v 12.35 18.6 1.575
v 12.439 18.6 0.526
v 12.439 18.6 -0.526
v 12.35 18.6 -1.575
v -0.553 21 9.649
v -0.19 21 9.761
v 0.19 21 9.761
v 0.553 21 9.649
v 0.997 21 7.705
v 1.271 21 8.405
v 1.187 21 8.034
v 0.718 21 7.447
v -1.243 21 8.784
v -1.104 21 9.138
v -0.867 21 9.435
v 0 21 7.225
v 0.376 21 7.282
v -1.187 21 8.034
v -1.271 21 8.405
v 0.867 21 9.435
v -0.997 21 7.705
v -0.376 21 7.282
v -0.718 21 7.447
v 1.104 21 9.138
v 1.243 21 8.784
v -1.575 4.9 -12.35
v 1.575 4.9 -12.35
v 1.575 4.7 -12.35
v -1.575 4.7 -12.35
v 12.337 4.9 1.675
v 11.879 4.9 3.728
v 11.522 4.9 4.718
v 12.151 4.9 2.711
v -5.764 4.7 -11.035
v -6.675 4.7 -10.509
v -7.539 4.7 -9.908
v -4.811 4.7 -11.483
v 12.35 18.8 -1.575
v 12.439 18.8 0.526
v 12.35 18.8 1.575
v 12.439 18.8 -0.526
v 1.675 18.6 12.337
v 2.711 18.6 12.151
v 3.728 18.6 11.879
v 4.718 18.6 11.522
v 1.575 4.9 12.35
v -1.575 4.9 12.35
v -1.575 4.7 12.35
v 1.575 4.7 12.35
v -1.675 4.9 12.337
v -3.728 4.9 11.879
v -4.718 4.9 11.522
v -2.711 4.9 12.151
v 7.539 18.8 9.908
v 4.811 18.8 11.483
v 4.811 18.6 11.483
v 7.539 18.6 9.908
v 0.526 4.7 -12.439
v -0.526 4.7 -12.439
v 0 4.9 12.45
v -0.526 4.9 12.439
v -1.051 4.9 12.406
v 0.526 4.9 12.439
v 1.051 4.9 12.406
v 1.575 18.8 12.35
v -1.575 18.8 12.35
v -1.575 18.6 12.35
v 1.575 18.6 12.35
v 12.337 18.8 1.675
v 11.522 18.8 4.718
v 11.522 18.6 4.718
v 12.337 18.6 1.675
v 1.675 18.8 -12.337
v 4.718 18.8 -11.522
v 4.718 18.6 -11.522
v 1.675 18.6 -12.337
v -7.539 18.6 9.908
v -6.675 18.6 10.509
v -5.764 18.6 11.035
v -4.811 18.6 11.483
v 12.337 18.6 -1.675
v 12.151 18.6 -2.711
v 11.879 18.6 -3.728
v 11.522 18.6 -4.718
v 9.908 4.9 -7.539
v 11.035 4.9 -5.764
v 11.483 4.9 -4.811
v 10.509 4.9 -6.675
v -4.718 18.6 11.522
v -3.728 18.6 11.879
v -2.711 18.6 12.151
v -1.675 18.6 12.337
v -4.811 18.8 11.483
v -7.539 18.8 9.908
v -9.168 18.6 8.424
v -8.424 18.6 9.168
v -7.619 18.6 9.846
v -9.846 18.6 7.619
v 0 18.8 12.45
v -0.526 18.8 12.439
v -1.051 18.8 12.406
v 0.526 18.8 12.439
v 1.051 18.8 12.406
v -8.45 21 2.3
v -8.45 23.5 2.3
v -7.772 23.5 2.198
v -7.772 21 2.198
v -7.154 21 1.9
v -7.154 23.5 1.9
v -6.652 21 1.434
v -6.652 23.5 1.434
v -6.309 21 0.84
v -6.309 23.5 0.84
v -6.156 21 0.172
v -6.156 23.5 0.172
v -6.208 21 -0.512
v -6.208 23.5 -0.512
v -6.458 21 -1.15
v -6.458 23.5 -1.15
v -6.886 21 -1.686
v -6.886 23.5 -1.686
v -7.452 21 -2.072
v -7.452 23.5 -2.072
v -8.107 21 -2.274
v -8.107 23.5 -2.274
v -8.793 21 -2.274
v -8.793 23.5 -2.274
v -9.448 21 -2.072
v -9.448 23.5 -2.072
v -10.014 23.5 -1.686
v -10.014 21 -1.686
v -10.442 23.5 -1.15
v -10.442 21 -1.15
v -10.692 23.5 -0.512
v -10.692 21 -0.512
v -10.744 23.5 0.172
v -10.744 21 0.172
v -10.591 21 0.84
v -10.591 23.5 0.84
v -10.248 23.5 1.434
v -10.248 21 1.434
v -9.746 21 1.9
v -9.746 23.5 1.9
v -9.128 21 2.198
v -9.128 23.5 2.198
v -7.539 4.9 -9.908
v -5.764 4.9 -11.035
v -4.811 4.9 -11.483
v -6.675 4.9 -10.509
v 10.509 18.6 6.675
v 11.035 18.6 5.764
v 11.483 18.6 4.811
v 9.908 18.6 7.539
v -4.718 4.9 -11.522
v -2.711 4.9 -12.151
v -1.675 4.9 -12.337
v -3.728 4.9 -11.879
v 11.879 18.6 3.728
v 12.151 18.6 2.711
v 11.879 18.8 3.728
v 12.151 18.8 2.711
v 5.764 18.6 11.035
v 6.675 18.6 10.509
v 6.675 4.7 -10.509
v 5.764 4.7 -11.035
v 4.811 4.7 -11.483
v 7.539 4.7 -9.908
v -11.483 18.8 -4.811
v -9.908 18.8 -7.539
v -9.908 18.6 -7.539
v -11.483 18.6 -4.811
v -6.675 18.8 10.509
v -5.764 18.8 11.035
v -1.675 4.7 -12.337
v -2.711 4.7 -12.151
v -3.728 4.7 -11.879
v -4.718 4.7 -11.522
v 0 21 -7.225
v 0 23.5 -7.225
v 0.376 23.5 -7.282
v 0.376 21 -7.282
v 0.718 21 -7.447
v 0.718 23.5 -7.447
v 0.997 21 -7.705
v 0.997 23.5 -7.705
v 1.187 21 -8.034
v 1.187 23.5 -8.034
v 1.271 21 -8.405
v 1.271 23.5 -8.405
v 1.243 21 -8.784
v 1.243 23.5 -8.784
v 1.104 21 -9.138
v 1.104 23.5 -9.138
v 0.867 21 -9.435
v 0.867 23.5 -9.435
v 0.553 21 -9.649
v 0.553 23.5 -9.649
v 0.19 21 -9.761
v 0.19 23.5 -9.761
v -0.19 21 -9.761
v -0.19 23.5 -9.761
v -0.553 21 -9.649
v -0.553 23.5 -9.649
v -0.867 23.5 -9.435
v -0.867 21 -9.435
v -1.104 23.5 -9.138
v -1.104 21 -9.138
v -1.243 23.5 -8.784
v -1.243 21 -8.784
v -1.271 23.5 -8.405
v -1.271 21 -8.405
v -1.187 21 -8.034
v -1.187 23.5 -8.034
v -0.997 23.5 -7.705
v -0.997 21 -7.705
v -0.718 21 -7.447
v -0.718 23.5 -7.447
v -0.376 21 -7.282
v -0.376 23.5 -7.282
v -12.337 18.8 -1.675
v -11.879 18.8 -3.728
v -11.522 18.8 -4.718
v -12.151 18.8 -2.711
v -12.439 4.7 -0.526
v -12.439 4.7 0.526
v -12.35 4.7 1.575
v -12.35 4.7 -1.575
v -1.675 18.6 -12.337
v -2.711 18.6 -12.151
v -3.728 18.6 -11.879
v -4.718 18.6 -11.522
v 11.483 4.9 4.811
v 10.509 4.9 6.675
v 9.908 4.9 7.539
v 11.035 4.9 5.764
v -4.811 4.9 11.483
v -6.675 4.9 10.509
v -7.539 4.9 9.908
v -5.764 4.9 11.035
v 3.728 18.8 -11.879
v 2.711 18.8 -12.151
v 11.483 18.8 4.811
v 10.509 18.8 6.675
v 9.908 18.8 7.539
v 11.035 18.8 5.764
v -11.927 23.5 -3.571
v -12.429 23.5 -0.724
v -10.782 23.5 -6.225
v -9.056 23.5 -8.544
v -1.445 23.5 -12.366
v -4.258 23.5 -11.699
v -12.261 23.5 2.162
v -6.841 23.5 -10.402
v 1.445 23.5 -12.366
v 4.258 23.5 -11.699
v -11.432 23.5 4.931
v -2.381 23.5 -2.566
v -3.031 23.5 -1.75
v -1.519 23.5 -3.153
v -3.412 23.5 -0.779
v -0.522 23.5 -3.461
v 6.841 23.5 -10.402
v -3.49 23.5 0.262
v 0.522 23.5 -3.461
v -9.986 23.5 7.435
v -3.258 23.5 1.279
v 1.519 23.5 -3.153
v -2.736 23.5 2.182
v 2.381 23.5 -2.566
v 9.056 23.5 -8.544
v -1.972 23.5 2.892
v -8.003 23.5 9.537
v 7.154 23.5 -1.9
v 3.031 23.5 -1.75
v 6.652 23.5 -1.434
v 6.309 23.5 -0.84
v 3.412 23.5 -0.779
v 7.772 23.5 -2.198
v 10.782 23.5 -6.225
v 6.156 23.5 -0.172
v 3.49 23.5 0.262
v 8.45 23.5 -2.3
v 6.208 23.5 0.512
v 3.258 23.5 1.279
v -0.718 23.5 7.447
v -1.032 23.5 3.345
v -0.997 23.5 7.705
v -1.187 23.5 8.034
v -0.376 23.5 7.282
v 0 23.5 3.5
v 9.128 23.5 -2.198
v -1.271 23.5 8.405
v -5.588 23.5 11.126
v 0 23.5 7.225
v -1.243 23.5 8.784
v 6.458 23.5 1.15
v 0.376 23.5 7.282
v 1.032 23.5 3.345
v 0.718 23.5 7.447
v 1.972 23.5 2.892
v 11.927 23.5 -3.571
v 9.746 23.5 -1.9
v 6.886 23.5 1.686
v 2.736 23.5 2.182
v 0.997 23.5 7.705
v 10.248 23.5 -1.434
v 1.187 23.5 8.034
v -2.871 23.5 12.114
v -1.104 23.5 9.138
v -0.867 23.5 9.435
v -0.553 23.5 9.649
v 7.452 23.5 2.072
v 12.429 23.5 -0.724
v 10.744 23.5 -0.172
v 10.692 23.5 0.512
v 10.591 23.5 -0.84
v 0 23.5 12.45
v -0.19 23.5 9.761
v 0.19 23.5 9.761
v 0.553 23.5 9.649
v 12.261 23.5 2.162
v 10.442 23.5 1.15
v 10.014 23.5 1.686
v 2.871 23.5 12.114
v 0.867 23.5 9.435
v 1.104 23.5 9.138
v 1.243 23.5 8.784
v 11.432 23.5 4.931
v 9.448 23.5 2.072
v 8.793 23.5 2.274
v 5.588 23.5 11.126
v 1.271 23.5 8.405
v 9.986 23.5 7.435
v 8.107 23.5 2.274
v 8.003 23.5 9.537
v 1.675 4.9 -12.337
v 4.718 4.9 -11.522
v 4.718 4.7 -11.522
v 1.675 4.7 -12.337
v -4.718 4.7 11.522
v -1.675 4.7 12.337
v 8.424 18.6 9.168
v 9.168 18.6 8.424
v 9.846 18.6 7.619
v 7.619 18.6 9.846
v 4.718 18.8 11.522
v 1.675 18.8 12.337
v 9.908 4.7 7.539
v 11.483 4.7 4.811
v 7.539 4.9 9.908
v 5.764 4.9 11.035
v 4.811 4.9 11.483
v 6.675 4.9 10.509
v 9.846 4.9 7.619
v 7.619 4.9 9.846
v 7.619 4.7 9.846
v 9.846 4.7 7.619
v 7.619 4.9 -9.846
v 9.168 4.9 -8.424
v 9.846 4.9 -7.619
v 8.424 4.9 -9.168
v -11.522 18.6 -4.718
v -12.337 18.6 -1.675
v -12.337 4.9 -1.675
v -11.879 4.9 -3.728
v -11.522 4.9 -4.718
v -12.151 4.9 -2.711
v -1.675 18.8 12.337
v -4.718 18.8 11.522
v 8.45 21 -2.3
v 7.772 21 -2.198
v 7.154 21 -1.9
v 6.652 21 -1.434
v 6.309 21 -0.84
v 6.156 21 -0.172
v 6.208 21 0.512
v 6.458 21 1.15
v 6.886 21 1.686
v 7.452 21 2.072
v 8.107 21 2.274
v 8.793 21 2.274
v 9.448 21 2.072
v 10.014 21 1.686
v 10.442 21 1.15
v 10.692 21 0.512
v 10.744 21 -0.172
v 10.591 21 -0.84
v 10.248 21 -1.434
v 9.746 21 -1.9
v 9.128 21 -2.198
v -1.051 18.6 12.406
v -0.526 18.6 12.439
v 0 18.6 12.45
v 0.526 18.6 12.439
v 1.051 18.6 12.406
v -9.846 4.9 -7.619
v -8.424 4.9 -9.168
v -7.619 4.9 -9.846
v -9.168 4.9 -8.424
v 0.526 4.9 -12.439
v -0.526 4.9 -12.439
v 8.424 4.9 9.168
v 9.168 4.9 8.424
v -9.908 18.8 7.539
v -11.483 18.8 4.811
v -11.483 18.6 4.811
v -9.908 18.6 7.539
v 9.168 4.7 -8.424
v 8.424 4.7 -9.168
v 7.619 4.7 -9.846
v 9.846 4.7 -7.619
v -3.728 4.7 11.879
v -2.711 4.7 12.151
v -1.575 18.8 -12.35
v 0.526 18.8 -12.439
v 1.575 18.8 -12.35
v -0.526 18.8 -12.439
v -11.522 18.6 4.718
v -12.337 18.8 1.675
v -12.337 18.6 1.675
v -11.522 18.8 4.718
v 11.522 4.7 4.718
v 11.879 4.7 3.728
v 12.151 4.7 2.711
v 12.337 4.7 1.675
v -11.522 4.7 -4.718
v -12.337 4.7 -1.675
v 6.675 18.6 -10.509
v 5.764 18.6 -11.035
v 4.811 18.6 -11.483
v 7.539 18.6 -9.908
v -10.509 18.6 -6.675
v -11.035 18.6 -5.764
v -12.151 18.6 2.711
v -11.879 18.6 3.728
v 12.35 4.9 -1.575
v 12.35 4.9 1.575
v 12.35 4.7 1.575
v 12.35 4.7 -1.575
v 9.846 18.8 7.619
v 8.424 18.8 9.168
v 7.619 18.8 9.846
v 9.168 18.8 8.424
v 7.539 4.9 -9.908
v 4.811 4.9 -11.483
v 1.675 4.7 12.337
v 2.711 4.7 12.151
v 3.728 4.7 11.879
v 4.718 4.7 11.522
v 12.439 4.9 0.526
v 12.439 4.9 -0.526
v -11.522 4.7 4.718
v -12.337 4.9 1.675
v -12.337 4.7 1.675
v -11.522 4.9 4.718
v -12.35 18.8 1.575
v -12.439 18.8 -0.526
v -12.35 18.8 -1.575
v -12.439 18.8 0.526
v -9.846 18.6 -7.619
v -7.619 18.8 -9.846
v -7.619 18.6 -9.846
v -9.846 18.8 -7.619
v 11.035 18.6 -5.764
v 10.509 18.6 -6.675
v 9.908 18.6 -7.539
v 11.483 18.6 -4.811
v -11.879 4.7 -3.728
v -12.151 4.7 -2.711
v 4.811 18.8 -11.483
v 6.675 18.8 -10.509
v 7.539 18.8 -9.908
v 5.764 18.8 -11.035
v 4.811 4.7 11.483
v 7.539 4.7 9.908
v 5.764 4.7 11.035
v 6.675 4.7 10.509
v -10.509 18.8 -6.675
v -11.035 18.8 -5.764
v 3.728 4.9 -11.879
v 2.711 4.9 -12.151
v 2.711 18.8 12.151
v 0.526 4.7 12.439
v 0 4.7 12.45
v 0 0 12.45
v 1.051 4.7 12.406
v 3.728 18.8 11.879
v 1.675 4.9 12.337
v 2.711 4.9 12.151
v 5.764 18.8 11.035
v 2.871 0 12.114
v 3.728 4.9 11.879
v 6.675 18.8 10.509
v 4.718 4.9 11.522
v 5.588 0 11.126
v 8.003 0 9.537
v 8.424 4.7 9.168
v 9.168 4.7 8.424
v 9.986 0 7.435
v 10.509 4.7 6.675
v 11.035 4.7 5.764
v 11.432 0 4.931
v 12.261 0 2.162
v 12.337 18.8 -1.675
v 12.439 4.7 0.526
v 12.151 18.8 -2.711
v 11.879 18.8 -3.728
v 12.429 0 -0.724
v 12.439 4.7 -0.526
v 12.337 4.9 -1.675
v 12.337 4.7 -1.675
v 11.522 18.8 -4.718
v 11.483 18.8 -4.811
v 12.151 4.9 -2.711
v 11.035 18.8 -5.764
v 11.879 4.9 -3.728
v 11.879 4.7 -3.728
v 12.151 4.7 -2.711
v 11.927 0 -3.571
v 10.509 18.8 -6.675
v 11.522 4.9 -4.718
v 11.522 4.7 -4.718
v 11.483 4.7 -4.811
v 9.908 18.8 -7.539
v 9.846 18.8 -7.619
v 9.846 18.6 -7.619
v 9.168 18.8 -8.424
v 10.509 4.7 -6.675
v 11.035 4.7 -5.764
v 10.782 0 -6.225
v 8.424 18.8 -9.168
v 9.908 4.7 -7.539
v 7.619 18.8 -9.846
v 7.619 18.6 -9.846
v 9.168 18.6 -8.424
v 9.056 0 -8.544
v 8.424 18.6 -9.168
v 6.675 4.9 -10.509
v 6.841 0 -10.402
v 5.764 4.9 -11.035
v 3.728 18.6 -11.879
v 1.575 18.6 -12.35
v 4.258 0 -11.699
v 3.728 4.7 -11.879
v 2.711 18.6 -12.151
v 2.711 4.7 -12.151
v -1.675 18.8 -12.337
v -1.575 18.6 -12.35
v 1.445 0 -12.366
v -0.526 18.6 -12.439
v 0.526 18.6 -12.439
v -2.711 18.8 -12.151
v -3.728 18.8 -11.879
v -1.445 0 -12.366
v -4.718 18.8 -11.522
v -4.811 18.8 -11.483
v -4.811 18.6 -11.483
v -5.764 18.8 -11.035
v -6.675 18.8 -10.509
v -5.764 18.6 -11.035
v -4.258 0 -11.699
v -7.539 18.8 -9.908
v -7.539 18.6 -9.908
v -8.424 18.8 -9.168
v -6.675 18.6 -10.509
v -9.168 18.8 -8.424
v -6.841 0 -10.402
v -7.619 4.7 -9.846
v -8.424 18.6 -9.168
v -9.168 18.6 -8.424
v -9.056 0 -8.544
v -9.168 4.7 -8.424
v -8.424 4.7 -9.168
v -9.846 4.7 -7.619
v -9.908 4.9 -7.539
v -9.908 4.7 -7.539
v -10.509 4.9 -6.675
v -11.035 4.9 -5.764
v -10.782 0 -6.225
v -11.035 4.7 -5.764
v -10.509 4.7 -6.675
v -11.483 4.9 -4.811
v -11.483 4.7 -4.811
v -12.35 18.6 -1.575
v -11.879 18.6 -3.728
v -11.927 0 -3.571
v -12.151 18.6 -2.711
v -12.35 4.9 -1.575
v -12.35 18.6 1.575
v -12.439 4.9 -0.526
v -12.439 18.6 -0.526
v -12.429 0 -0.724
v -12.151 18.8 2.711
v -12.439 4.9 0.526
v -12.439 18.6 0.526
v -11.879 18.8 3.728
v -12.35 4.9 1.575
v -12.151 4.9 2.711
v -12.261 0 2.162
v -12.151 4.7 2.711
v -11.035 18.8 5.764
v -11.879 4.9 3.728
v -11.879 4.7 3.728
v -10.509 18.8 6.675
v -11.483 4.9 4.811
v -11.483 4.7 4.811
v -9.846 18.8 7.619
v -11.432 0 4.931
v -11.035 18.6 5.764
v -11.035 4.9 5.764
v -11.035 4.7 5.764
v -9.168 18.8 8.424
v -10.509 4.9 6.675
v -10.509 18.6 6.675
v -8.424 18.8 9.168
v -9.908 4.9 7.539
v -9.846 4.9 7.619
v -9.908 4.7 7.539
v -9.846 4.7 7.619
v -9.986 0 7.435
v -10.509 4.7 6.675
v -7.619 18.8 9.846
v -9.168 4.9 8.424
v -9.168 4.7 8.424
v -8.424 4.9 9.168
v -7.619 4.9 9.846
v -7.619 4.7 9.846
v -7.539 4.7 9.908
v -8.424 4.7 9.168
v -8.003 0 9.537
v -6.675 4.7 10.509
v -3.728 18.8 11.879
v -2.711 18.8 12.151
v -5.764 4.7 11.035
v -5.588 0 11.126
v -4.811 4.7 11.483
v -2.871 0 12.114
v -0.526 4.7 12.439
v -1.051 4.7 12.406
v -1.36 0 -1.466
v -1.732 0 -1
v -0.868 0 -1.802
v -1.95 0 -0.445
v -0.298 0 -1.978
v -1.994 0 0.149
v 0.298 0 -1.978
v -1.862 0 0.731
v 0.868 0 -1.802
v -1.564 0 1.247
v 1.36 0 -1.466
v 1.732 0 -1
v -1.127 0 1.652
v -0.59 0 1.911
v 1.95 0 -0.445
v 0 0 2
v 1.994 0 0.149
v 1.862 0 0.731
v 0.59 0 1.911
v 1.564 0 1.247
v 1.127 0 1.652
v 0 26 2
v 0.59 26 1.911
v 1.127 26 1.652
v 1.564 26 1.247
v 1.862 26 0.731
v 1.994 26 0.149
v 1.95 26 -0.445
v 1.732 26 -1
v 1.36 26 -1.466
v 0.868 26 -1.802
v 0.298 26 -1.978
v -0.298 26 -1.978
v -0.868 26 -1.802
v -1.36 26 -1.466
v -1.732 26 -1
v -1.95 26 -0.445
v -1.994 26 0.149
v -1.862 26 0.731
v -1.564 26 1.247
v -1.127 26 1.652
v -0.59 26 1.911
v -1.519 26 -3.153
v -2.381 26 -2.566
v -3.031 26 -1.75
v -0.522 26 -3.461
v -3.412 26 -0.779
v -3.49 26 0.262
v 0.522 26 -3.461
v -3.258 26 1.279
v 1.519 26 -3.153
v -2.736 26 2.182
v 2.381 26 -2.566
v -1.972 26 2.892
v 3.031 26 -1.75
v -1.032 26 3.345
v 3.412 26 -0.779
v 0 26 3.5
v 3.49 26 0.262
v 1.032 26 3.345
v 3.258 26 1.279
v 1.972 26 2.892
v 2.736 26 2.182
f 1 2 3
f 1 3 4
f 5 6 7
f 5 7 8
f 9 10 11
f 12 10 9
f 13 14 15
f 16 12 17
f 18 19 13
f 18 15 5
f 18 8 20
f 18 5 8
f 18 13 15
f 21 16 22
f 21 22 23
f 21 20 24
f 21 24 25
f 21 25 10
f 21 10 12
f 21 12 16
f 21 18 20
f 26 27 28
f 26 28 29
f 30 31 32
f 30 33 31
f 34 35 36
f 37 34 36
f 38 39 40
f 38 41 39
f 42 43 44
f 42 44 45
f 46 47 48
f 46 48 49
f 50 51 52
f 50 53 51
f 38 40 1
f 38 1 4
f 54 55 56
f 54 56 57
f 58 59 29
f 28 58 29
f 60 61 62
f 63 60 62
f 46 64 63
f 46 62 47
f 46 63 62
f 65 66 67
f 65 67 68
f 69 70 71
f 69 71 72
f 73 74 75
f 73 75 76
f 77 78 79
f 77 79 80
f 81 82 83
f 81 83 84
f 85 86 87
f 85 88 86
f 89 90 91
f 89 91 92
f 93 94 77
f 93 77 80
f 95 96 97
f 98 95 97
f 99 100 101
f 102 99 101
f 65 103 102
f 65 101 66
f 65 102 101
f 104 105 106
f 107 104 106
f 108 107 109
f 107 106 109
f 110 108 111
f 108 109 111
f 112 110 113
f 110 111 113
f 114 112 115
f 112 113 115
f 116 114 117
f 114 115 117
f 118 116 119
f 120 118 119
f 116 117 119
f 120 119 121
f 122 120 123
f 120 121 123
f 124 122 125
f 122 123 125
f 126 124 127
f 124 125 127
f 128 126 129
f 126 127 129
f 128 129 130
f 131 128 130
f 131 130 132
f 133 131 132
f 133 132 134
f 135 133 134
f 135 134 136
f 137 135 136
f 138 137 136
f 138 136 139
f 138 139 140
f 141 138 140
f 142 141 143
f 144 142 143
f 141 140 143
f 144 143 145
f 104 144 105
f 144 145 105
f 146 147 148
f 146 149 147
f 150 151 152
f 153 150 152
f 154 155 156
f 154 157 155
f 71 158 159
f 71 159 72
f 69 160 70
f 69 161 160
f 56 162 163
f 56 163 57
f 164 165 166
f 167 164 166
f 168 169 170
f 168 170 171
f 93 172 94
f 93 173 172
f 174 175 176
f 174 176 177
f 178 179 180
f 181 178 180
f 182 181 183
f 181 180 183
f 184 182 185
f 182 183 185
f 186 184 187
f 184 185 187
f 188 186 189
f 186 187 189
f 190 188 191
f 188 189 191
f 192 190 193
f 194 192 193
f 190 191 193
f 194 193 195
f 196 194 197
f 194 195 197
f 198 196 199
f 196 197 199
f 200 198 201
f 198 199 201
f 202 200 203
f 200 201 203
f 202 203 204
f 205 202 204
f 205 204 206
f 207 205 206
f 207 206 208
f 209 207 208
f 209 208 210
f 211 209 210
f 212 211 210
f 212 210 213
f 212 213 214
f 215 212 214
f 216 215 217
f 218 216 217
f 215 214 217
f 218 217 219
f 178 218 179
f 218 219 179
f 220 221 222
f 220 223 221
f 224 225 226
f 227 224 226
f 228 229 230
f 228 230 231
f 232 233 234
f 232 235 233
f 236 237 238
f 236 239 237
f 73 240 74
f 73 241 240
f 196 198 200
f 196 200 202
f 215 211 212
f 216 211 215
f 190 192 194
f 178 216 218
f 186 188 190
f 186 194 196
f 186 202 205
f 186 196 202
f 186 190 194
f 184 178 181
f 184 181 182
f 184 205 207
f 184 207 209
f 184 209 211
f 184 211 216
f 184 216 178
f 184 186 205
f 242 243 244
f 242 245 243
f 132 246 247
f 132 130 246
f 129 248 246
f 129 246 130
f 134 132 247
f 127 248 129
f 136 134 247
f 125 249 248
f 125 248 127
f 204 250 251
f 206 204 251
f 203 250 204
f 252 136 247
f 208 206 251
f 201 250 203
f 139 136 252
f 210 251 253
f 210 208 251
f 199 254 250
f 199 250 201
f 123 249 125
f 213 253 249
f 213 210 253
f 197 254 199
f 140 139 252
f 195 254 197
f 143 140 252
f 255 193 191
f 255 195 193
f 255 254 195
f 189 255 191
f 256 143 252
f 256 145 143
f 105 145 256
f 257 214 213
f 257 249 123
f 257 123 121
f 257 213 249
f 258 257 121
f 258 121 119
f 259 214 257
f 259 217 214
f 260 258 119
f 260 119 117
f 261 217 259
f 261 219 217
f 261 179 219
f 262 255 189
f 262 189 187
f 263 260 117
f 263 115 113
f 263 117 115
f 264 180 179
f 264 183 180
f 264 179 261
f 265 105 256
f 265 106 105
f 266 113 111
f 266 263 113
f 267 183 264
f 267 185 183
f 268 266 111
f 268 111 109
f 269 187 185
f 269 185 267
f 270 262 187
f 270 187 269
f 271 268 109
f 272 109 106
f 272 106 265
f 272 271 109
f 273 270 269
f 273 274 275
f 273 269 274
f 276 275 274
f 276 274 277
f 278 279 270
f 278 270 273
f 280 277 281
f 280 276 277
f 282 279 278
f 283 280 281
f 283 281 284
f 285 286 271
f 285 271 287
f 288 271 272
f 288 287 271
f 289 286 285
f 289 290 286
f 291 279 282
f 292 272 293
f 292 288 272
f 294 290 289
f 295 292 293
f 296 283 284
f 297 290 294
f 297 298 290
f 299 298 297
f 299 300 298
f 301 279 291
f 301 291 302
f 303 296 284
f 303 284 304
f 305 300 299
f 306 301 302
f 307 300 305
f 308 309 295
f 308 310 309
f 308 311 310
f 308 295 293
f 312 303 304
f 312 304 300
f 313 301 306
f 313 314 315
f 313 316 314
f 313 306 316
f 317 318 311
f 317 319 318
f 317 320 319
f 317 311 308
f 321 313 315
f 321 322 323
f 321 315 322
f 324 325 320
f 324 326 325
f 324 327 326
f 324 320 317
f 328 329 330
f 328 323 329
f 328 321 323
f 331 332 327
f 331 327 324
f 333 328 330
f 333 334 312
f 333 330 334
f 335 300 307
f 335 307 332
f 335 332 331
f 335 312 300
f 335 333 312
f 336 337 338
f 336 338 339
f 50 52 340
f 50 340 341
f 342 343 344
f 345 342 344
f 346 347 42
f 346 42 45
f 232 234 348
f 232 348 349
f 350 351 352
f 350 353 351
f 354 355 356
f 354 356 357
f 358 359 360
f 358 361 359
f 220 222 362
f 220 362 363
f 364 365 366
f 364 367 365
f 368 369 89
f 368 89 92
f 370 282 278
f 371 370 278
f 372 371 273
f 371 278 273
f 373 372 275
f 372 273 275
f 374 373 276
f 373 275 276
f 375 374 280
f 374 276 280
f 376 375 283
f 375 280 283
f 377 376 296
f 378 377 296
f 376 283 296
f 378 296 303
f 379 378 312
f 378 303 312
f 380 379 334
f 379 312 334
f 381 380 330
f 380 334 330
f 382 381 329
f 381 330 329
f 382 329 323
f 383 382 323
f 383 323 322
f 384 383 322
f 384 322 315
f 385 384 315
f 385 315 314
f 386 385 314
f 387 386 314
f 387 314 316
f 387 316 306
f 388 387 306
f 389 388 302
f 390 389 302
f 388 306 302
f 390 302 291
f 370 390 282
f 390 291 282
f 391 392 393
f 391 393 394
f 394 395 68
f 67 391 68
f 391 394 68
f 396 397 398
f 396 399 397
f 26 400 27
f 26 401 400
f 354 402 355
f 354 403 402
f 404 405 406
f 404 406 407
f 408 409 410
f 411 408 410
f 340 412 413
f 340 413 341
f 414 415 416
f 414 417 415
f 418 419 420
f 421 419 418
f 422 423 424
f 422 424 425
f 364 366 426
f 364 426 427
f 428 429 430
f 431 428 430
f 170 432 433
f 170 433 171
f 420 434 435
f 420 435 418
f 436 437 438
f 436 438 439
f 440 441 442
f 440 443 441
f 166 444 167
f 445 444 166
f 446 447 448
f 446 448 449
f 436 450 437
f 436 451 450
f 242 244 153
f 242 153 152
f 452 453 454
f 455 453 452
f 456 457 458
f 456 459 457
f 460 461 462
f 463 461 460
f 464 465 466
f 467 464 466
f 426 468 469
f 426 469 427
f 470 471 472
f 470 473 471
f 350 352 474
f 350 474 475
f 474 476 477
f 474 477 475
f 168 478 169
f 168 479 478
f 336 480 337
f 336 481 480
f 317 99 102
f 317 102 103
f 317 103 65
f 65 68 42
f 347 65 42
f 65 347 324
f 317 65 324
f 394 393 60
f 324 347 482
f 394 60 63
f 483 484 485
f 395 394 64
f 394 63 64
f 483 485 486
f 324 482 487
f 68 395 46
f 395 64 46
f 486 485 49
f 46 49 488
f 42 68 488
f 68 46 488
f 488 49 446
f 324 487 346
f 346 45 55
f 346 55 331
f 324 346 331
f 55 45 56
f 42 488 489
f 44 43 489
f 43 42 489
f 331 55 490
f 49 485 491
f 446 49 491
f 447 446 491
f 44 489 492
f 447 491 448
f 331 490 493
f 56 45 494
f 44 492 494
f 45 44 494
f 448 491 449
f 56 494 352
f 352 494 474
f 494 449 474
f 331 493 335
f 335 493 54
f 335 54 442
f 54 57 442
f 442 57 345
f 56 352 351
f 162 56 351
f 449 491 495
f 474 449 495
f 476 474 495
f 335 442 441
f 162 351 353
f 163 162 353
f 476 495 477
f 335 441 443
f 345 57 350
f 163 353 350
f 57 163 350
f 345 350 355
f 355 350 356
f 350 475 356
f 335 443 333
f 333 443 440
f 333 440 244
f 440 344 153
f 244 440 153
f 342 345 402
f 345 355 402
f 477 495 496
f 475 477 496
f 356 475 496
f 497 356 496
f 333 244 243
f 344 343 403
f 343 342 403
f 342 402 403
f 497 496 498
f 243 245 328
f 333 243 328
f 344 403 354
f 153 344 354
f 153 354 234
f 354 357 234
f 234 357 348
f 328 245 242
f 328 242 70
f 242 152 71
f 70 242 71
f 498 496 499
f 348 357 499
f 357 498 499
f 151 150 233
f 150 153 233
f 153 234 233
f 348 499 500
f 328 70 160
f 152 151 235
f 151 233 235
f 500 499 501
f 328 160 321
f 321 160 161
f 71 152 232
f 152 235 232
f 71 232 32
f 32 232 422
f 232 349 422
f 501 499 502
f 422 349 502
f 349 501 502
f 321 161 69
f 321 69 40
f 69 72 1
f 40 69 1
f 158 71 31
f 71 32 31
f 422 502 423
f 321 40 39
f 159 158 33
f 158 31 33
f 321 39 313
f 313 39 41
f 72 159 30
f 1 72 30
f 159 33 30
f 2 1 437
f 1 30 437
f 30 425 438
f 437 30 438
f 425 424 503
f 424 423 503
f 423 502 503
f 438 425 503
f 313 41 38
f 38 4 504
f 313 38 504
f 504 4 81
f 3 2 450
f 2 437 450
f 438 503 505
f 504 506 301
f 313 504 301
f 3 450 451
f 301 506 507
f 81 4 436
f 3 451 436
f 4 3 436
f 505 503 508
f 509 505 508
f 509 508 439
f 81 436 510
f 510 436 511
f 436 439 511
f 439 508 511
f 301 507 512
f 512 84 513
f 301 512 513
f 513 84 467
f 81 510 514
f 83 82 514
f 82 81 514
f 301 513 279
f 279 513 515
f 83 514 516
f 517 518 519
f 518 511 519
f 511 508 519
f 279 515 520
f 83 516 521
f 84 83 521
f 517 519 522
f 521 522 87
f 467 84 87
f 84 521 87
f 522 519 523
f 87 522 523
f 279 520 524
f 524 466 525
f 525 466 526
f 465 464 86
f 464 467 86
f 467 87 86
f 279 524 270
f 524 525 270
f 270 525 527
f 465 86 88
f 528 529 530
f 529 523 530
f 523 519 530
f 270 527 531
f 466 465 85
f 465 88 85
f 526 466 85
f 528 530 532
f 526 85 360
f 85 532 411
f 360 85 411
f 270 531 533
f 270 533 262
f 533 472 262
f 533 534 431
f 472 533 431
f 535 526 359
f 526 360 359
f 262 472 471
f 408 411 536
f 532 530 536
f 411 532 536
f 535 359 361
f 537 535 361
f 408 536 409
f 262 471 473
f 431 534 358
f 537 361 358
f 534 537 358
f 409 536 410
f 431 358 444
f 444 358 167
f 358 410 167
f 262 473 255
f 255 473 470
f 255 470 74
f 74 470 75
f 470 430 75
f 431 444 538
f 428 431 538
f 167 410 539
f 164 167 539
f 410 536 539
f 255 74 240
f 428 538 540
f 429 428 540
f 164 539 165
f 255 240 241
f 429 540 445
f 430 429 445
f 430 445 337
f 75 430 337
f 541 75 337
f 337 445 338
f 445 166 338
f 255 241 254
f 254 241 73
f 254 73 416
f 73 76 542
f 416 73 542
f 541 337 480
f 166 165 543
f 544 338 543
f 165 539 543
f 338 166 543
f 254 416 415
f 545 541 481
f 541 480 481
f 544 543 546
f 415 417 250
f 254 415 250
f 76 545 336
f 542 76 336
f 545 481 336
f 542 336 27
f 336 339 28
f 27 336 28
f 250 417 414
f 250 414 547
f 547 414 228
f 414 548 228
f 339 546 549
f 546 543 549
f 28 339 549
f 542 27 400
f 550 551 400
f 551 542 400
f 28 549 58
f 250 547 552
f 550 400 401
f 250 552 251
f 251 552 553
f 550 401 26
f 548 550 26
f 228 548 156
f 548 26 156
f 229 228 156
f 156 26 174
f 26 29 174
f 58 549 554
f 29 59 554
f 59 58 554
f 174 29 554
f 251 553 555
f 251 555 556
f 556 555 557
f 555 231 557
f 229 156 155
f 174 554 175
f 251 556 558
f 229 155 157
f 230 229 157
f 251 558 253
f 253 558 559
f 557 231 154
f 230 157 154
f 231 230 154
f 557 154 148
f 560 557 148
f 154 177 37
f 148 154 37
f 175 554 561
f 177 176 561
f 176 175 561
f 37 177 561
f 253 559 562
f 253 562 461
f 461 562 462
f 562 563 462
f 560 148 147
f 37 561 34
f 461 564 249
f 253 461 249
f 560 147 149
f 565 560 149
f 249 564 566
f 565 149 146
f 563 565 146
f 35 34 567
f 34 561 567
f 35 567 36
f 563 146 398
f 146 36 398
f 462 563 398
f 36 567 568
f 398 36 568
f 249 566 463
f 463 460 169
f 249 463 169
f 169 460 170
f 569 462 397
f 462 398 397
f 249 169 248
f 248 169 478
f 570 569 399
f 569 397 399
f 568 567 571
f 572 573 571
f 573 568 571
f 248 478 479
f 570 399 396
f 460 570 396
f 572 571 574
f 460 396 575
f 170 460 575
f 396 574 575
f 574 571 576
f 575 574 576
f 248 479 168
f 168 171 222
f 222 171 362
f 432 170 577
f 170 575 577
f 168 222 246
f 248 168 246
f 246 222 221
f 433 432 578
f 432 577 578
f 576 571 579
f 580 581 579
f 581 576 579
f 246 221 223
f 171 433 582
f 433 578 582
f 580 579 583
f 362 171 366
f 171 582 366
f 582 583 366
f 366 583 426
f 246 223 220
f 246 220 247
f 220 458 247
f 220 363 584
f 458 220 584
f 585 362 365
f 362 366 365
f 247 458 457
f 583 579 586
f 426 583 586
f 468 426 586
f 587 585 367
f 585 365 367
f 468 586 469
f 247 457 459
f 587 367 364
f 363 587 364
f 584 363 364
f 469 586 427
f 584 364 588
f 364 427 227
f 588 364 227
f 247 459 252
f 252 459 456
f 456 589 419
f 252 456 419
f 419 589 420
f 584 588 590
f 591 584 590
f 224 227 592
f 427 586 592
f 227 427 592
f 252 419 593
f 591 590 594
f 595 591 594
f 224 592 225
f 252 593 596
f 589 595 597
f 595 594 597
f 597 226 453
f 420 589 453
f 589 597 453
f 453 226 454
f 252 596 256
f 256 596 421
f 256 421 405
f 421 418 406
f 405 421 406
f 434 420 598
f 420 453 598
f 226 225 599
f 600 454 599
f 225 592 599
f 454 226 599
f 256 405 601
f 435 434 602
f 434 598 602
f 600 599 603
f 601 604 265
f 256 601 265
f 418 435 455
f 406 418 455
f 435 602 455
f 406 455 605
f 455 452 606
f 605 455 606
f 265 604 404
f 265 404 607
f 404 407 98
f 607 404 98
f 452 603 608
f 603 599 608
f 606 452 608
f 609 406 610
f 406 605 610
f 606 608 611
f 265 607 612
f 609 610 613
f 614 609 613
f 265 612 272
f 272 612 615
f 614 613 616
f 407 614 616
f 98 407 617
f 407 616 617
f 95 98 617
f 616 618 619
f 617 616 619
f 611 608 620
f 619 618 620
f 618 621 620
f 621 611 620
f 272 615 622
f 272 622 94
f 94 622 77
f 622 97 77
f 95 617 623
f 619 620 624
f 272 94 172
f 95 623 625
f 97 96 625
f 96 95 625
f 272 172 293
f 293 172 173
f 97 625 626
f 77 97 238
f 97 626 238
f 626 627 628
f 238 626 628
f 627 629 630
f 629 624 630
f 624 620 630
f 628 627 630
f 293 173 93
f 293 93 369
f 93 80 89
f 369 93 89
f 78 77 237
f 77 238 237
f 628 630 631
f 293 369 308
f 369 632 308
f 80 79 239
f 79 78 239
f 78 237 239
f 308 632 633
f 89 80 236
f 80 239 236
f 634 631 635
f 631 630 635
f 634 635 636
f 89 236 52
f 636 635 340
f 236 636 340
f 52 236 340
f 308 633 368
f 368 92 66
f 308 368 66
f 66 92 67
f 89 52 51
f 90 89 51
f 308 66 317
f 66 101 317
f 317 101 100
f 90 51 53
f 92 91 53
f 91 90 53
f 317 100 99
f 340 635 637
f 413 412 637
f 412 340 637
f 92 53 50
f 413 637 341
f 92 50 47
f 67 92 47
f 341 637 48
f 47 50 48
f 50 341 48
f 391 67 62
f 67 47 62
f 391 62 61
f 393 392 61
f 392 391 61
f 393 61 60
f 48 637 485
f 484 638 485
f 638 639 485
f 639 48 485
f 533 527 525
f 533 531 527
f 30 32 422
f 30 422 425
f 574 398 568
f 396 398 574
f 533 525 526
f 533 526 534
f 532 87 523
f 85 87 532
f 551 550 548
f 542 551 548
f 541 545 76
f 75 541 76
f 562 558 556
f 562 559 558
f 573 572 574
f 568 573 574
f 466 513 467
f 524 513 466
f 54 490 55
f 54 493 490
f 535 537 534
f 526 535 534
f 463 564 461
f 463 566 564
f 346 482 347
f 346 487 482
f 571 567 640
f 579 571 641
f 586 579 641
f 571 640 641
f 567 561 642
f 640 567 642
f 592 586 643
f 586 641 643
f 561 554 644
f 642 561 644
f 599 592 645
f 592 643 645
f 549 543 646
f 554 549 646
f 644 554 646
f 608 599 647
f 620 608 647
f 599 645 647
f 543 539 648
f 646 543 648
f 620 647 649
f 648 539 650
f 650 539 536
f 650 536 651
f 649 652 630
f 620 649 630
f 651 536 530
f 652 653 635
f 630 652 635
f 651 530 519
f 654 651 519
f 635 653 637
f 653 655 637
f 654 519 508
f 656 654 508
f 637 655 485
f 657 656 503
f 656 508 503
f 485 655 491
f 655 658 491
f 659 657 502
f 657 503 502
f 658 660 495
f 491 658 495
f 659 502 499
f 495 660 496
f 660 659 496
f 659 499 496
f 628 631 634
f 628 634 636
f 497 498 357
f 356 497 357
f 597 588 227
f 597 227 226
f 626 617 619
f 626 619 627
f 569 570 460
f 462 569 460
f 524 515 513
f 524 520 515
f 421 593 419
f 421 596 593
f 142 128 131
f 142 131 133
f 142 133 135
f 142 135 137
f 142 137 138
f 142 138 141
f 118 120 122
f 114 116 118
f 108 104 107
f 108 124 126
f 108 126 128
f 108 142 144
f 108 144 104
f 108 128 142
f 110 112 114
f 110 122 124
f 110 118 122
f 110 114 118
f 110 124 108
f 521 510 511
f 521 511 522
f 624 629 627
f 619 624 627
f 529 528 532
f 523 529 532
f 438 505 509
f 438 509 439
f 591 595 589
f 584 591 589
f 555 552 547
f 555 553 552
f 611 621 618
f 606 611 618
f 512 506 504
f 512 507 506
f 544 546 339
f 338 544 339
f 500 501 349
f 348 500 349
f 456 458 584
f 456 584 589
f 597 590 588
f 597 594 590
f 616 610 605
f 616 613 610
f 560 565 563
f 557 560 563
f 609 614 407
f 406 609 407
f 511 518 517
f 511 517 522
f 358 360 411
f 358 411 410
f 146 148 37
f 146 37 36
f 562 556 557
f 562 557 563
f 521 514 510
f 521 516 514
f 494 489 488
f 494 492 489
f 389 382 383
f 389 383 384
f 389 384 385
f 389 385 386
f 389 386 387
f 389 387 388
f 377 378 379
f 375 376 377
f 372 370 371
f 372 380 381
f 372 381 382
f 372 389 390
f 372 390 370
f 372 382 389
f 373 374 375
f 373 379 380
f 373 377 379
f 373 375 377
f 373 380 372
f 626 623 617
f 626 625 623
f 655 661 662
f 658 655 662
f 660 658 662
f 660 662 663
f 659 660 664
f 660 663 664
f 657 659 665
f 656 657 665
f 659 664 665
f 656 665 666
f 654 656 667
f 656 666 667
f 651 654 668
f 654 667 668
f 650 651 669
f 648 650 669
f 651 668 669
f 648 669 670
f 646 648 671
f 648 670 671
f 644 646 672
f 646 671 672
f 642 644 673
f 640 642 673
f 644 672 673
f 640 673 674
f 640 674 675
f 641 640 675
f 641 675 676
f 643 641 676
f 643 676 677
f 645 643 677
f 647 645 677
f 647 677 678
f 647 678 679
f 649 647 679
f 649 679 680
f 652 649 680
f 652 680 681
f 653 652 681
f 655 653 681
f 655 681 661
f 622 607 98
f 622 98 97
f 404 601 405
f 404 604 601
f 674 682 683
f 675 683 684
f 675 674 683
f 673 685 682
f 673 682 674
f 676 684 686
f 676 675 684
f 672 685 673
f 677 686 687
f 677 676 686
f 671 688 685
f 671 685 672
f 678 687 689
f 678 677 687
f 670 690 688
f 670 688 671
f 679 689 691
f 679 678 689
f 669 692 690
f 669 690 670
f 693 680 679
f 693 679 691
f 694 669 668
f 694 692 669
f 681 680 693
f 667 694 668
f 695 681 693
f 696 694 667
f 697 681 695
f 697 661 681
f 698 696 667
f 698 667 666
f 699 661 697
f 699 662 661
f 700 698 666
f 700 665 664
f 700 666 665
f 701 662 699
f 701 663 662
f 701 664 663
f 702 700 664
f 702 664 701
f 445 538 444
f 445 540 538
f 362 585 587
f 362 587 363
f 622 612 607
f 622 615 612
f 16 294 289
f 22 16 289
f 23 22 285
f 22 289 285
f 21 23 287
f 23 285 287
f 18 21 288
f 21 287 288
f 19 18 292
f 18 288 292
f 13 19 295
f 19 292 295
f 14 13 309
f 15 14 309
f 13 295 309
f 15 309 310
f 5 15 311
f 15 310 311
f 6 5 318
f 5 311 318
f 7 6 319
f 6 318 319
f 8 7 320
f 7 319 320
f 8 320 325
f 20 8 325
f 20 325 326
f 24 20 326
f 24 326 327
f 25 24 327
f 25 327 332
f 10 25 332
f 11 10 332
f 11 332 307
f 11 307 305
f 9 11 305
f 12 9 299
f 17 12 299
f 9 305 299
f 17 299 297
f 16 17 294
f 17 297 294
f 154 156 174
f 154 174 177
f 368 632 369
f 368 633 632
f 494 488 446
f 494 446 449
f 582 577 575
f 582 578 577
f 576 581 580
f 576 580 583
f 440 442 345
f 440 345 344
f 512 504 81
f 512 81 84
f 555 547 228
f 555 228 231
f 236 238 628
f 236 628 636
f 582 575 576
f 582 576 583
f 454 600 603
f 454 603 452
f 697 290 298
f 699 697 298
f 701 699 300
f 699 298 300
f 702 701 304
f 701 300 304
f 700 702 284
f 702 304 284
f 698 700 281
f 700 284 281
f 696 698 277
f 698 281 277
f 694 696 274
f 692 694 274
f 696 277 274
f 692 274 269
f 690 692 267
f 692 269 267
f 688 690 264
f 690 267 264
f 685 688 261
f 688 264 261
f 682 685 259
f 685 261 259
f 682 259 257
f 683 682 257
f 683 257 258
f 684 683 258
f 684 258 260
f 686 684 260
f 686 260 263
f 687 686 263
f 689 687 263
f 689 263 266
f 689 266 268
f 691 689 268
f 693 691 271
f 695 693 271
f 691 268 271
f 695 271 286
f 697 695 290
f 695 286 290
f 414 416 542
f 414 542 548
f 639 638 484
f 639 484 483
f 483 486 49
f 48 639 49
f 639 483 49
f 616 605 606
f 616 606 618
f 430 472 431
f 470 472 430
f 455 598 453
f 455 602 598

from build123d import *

# Parameters (mm, degrees)
CROQUIS1_R              = 12.45
SALIENTE_EXTRUIR1_DEPTH = 23.5
CROQUIS2_W              = 24.9
CROQUIS2_H              = 0.2
CORTAR_EXTRUIR1_DEPTH   = 0.1
MATRIZC1_COUNT          = 24
CROQUIS5_R              = 3.5
SALIENTE_EXTRUIR2_DEPTH = 2.5
CROQUIS6_R              = 2
CORTAR_EXTRUIR3_DEPTH   = 32.400716552
CROQUIS7_R              = 1.275
CROQUIS7_R_2            = 2.3
CORTAR_EXTRUIR4_DEPTH   = 2.5


with BuildPart() as part:
    # Croquis1 → Saliente-Extruir1 (new body)
    with BuildSketch(Plane(origin=(0, 0, 0), x_dir=(1, 0, 0), z_dir=(0, 1, 0))):
        with Locations(Location((0, 0, 0), (0, 0, 270))):
            Circle(CROQUIS1_R)
    extrude(amount=SALIENTE_EXTRUIR1_DEPTH)

    # Croquis2 → Cortar-Extruir1 (cut)
    with BuildSketch(Plane.XY.offset(12.45)):
        with Locations((0, 18.7)):
            Rectangle(CROQUIS2_W, CROQUIS2_H)
        with Locations((0, 4.8)):
            Rectangle(CROQUIS2_W, CROQUIS2_H)
    cortar_extruir1 = extrude(amount=-CORTAR_EXTRUIR1_DEPTH, mode=Mode.SUBTRACT)

    # MatrizC1: Cortar-Extruir1 ×24 about axis
    matrizc1_axis = Axis((0, 0, 0), (0, 1, 0))
    for i in range(1, MATRIZC1_COUNT):
        add(cortar_extruir1.rotate(matrizc1_axis, i * 360 / MATRIZC1_COUNT), mode=Mode.SUBTRACT)

    # Croquis5 → Saliente-Extruir2 (add)
    with BuildSketch(Plane(origin=(0, 23.5, 0), x_dir=(1, 0, 0), z_dir=(0, 1, 0))):
        with Locations(Location((0, 0, 0), (0, 0, 270))):
            Circle(CROQUIS5_R)
    extrude(amount=SALIENTE_EXTRUIR2_DEPTH)

    # Croquis6 → Cortar-Extruir3 (cut, through all)
    with BuildSketch(Plane(origin=(0, 26, 0), x_dir=(1, 0, 0), z_dir=(0, 1, 0))):
        with Locations(Location((0, 0, 0), (0, 0, 270))):
            Circle(CROQUIS6_R)
    extrude(amount=-CORTAR_EXTRUIR3_DEPTH, mode=Mode.SUBTRACT)

    # Croquis7 → Cortar-Extruir4 (cut)
    with BuildSketch(Plane(origin=(0, 23.5, 0), x_dir=(1, 0, 0), z_dir=(0, 1, 0))):
        with Locations(Location((0, 8.5, 0), (0, 0, 270))):
            Circle(CROQUIS7_R)
        with Locations(Location((0, -8.5, 0), (0, 0, 90))):
            Circle(CROQUIS7_R)
        with Locations(Location((-8.45, 0, 0), (0, 0, 270))):
            Circle(CROQUIS7_R_2)
        with Locations(Location((8.45, 0, 0), (0, 0, 90))):
            Circle(CROQUIS7_R_2)
    extrude(amount=-CORTAR_EXTRUIR4_DEPTH, mode=Mode.SUBTRACT)


solid = part.part
